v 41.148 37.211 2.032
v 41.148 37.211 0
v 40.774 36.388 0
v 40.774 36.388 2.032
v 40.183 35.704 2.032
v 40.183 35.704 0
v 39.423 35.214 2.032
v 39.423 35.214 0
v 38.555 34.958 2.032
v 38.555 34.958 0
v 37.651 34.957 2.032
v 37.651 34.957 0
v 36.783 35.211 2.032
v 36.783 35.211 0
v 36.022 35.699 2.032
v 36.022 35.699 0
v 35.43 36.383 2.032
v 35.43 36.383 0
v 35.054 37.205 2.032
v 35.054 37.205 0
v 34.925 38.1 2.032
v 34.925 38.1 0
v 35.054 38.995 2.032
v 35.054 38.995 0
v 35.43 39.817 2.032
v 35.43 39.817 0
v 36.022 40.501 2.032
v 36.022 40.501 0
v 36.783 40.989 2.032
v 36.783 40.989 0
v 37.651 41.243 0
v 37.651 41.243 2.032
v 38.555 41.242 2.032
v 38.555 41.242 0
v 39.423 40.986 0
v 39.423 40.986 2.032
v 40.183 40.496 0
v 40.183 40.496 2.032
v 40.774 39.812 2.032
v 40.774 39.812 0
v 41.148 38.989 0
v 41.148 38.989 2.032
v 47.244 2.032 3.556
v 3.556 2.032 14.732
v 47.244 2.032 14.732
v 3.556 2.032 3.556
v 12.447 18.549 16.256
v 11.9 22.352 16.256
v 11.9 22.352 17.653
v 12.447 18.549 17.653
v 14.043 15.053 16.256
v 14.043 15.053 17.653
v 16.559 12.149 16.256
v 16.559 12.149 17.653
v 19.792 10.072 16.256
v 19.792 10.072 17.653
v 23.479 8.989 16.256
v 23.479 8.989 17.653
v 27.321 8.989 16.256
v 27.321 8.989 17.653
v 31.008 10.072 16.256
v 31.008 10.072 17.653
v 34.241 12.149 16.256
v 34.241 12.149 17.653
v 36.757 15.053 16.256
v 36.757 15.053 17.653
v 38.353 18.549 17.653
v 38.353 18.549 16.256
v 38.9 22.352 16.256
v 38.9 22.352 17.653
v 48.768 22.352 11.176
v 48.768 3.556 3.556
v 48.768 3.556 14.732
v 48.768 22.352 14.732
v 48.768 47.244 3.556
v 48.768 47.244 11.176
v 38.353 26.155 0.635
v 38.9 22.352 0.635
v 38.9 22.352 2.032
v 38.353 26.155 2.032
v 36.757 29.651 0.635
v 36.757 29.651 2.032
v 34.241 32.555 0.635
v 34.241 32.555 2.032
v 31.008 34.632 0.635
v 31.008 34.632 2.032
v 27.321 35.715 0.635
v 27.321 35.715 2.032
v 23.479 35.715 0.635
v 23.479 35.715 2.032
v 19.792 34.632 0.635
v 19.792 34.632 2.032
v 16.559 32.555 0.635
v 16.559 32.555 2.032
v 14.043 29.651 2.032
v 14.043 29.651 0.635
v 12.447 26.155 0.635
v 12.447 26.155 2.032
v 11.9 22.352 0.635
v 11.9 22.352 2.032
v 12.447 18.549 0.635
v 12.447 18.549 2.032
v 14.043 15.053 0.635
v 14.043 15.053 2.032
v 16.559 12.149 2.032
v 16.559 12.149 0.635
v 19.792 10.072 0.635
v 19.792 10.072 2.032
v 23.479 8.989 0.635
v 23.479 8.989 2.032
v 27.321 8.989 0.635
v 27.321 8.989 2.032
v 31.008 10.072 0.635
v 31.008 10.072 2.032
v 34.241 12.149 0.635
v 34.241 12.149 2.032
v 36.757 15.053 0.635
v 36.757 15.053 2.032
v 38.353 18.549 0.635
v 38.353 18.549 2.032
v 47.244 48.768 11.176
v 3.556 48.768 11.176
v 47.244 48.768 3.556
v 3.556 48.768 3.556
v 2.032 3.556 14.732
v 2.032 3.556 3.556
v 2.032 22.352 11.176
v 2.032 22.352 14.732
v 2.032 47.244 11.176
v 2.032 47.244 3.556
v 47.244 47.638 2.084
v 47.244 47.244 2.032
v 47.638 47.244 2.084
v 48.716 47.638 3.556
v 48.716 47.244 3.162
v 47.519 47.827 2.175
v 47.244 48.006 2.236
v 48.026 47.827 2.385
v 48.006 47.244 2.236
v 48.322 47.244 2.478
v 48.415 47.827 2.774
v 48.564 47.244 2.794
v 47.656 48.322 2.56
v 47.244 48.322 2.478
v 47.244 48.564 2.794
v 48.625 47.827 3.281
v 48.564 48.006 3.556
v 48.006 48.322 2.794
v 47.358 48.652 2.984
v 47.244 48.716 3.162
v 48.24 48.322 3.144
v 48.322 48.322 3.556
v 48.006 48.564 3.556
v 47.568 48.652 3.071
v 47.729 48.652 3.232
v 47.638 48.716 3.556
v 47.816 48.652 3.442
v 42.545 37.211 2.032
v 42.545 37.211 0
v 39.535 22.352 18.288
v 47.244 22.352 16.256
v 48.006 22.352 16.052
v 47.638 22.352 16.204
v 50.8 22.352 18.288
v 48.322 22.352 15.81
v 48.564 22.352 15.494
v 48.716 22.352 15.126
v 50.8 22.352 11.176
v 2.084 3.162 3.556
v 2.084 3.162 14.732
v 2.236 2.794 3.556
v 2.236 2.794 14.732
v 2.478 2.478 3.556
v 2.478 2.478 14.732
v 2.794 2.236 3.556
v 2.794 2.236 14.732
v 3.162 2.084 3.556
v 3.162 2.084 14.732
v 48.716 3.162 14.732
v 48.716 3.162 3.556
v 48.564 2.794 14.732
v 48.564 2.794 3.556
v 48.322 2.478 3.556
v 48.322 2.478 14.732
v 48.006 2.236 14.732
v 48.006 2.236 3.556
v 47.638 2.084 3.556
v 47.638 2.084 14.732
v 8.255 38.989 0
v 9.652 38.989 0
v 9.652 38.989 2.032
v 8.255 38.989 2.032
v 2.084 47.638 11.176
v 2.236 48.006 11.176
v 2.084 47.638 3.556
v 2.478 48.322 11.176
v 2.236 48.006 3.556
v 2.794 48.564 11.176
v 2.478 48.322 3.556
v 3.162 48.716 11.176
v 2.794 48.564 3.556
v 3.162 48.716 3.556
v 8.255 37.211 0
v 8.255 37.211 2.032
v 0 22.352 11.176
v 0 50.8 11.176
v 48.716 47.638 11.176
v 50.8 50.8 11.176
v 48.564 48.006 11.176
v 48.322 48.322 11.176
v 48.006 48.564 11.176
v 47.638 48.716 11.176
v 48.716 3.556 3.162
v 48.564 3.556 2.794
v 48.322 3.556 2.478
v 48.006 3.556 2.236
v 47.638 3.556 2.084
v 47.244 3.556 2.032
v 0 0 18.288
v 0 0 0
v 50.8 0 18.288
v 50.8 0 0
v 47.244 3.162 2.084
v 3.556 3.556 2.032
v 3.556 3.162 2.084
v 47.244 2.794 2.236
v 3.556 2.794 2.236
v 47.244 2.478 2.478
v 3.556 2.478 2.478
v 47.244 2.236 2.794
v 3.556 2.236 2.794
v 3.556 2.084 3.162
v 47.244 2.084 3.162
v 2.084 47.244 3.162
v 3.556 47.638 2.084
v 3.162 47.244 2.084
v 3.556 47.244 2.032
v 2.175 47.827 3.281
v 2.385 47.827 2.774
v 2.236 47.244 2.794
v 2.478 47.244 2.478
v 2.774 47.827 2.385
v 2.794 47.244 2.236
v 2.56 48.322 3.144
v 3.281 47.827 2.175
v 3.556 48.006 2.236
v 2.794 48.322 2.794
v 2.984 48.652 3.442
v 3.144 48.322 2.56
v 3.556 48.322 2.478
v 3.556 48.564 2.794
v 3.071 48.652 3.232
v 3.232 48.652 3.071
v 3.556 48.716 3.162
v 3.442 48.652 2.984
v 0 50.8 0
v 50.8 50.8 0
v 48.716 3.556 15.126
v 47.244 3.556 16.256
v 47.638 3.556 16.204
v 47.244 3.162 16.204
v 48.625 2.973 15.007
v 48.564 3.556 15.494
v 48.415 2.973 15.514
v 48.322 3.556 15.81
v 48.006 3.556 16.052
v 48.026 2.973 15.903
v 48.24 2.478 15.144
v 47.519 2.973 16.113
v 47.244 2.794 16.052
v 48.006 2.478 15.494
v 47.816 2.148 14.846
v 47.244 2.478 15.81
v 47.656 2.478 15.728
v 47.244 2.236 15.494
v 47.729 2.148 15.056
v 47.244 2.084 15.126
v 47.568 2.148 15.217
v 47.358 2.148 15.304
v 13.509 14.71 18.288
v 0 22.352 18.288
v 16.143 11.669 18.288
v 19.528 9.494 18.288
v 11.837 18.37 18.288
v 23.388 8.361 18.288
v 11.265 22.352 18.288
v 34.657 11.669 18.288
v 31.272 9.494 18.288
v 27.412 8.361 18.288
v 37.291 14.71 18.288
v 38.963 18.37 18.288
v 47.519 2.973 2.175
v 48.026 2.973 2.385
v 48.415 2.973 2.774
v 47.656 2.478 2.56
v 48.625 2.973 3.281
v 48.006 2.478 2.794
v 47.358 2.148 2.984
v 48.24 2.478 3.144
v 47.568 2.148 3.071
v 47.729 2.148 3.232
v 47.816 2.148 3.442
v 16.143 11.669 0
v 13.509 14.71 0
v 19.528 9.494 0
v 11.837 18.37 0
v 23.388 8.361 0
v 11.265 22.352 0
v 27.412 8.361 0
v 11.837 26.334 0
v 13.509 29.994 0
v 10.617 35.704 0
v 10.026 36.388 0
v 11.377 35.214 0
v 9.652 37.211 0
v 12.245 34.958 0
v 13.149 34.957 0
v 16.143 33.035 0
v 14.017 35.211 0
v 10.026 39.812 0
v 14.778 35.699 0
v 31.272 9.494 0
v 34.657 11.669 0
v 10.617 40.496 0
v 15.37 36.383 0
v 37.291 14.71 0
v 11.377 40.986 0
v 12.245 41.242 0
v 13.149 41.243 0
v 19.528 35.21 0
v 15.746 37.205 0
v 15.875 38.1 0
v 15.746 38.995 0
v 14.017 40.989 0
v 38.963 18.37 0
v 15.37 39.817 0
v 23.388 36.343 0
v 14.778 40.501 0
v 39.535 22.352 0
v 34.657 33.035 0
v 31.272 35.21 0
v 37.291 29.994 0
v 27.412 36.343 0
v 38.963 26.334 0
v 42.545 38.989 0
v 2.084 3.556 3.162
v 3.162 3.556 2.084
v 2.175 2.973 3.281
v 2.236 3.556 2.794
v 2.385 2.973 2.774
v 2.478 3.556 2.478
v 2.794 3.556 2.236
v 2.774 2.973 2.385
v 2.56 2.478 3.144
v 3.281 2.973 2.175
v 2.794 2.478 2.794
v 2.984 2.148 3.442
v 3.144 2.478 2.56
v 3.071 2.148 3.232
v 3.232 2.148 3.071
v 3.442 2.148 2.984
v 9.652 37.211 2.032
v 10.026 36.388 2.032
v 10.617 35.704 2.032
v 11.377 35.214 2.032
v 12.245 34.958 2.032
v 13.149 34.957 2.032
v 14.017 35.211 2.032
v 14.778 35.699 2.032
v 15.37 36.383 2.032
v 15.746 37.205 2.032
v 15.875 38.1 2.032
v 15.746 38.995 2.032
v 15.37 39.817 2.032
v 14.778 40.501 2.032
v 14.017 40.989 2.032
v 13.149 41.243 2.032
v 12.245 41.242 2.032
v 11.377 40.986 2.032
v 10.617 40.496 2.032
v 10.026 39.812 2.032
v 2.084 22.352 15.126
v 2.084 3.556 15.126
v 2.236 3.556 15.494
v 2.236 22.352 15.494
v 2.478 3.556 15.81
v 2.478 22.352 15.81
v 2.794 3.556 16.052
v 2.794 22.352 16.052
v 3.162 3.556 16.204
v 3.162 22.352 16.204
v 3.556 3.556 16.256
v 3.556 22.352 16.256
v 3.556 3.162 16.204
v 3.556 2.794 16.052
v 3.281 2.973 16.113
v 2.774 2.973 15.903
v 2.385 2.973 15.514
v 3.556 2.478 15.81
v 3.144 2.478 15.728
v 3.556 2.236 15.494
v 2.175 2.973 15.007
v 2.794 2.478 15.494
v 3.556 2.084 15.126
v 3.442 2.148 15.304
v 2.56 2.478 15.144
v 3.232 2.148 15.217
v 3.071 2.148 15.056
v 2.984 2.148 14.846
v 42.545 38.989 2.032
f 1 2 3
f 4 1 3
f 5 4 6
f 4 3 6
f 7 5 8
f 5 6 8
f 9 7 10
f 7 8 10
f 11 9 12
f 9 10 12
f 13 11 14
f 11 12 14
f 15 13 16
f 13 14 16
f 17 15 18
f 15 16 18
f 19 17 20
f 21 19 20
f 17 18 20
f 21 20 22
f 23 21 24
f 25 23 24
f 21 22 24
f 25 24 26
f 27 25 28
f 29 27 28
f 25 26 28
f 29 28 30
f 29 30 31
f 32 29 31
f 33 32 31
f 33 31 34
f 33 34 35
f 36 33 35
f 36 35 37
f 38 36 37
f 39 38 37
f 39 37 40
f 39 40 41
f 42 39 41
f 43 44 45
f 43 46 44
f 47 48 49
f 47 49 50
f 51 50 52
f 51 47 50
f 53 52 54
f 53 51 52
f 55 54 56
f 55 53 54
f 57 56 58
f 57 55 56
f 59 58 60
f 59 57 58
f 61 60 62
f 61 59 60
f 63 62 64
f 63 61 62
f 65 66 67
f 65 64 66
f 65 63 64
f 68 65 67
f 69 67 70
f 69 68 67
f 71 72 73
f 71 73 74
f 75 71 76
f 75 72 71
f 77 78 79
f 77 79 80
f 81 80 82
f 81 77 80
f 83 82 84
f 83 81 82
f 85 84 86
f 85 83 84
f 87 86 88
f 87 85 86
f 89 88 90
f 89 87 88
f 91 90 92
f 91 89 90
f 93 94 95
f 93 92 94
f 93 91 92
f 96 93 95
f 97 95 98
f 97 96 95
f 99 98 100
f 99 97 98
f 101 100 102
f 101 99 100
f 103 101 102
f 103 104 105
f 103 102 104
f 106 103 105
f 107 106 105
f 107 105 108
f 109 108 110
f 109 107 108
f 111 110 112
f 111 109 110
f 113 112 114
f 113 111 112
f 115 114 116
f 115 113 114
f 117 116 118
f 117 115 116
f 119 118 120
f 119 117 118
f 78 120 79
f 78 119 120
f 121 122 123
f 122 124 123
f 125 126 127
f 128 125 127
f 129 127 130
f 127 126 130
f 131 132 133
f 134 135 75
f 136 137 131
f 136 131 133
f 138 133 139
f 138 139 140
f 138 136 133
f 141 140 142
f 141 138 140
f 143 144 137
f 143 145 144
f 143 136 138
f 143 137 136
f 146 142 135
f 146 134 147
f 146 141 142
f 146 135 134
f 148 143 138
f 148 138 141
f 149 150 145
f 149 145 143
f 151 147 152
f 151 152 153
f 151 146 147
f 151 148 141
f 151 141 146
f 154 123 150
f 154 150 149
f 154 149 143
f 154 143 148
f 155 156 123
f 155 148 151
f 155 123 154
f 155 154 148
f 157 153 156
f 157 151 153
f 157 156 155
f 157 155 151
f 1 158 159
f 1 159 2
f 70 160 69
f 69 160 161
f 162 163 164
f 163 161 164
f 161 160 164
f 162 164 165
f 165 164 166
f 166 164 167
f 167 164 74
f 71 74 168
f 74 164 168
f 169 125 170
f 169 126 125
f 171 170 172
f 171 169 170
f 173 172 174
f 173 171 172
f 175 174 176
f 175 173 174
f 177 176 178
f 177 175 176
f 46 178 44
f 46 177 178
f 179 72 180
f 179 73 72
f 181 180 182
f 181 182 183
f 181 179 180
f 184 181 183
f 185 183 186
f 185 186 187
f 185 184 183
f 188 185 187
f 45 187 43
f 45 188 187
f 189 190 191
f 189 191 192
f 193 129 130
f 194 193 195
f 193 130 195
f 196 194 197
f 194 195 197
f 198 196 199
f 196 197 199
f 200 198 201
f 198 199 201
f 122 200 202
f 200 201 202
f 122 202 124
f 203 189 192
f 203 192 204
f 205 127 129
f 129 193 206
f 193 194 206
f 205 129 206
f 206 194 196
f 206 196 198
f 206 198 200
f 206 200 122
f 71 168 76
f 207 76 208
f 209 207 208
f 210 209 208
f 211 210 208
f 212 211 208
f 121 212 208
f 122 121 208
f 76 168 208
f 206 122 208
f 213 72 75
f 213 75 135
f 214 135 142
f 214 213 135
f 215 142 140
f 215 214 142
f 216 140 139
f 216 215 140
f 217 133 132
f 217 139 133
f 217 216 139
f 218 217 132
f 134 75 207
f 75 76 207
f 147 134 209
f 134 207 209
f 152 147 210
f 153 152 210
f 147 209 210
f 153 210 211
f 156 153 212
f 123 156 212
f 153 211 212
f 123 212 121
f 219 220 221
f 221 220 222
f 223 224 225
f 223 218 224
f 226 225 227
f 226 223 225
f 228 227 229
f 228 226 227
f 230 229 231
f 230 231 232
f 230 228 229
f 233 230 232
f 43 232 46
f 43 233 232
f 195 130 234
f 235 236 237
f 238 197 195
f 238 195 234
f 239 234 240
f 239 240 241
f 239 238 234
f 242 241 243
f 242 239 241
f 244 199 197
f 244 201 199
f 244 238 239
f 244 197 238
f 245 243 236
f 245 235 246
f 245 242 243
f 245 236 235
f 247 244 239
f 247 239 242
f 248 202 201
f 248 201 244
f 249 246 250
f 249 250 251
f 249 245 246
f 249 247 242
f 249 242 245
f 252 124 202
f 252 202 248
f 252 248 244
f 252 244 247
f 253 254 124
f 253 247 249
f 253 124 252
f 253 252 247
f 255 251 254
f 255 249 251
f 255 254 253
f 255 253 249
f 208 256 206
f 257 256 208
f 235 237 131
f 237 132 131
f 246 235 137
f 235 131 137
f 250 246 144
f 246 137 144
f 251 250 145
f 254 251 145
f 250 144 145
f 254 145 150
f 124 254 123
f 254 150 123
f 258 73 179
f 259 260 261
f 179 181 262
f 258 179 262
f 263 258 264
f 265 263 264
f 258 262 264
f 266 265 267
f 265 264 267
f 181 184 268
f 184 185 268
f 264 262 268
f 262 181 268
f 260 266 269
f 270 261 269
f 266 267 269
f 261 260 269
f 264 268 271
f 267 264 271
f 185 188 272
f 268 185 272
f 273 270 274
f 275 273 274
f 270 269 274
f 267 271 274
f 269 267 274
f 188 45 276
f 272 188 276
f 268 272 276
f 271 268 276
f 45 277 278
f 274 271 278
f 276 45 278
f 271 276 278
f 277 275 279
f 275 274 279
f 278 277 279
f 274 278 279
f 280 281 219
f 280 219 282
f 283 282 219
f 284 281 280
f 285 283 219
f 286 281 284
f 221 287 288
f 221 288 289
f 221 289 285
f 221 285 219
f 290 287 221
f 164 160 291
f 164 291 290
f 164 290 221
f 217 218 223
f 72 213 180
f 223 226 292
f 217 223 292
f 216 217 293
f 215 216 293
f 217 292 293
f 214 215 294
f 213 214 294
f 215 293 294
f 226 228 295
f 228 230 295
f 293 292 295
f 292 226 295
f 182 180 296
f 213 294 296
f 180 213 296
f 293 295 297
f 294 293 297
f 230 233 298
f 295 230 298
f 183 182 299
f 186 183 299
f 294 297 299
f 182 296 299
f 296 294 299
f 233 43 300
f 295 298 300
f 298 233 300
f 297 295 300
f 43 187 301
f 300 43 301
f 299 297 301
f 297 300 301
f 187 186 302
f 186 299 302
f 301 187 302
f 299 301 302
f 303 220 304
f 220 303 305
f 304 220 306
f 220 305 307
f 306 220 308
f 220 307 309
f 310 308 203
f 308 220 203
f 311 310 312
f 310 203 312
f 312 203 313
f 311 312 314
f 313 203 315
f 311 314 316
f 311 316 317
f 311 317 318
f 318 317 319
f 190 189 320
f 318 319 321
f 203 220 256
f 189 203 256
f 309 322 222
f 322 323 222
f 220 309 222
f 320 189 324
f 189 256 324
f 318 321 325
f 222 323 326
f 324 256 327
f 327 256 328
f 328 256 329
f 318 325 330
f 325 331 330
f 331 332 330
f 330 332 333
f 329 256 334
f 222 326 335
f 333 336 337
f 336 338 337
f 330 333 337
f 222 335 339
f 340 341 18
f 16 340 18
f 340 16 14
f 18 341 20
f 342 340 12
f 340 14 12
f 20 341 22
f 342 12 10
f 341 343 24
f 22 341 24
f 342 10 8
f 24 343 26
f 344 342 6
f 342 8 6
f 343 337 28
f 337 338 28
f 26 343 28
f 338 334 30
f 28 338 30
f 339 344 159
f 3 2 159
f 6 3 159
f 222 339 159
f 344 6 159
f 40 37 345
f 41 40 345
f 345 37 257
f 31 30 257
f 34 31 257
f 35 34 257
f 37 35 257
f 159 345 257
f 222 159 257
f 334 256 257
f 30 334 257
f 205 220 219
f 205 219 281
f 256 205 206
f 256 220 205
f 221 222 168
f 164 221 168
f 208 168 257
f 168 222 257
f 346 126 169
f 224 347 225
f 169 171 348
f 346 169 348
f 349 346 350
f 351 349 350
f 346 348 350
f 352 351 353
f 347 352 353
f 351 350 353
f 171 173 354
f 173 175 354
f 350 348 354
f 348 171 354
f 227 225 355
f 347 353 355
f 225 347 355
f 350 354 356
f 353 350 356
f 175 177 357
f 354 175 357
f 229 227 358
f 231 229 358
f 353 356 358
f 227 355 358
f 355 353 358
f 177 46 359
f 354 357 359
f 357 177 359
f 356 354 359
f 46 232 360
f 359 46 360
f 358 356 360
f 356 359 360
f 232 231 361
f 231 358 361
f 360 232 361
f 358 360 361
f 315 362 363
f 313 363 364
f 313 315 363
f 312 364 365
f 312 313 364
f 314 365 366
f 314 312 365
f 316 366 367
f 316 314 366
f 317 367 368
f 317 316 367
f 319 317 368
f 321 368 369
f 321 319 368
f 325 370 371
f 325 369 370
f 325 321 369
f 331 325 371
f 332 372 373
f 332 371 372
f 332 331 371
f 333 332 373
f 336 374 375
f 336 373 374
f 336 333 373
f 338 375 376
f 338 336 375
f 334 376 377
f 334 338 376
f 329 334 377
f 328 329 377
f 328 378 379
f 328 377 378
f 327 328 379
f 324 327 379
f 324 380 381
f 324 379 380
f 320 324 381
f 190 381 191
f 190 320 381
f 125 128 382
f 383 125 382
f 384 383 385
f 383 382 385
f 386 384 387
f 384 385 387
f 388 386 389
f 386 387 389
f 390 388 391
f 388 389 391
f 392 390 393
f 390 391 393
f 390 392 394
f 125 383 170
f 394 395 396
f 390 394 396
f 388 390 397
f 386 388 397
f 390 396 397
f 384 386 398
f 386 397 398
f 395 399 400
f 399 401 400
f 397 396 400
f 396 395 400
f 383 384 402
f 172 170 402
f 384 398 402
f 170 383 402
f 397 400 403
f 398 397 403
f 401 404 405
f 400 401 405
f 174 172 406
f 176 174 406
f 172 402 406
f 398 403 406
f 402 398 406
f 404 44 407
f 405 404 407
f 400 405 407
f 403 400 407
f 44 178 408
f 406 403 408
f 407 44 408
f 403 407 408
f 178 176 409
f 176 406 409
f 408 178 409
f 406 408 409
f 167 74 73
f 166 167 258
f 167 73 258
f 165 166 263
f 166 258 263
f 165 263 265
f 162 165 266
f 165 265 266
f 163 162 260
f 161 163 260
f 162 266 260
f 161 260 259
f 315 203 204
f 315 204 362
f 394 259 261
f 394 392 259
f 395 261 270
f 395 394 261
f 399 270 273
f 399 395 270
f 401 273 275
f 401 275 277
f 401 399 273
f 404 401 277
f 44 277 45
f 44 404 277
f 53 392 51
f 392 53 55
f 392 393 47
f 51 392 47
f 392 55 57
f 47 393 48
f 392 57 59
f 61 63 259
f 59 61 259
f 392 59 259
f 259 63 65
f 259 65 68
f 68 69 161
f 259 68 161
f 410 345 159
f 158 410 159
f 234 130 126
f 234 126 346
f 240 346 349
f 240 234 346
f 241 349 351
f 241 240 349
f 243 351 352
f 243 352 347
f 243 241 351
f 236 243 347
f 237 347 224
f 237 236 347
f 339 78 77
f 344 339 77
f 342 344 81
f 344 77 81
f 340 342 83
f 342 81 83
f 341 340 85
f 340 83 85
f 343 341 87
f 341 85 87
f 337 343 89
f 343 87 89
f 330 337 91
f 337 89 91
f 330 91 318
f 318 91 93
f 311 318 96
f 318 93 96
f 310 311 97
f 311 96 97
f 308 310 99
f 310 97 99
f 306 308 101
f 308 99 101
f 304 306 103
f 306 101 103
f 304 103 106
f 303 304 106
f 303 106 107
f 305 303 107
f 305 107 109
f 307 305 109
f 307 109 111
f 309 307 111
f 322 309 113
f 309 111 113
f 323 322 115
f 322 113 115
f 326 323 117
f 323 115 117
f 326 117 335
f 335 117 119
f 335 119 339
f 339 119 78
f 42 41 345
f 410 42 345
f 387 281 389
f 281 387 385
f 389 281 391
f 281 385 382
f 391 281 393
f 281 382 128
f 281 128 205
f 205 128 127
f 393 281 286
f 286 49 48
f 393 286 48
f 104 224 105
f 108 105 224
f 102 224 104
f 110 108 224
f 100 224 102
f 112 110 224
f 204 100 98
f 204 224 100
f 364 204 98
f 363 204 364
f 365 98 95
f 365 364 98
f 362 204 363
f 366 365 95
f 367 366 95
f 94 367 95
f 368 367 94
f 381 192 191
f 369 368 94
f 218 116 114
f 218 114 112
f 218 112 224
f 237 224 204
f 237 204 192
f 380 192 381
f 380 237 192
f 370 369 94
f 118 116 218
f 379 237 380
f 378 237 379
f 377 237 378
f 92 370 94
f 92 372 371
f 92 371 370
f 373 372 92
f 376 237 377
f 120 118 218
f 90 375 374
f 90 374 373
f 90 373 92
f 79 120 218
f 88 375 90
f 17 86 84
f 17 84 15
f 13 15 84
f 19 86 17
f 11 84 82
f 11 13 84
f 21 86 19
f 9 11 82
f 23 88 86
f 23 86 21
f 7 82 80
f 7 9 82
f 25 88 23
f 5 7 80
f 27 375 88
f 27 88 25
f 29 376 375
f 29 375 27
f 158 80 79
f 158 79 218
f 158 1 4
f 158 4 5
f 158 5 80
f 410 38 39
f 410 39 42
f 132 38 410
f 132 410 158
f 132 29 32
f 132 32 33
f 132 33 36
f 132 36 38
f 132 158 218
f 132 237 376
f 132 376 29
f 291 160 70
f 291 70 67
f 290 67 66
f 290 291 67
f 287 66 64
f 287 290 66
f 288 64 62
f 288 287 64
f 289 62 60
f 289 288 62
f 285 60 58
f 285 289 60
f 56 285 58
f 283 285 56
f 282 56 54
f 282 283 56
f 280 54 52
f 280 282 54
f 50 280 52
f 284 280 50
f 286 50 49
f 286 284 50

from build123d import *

# Parameters (mm, degrees)
SKETCH1_W          = 50.8
SKETCH1_H          = 50.8
MAIN_BODY_DEPTH    = 18.288
SKETCH2_W          = 7.112
SKETCH2_H          = 28.448
FRONT_CUT_DEPTH    = 75.133197314
SHELL1_T           = -2.032
SKETCH3_R          = 13.5001
CENTER_HOLE_DEPTH  = 75.133197314
FILL060_VERT_R     = 1.524
FILL060_TB_R       = 1.524
CHAM025_SIZE       = 0.635
KEYED_HOLE_1_DEPTH = 60.460200948


with BuildPart() as part:
    # Sketch1 → main body (new body)
    with BuildSketch(Plane.XY):
        with Locations((25.4, 25.4)):
            Rectangle(SKETCH1_W, SKETCH1_H)
    extrude(amount=MAIN_BODY_DEPTH)

    # Sketch2 → front cut (cut, through all)
    with BuildSketch(Plane(origin=(50.8, 0, 0), x_dir=(0, 0, -1), z_dir=(1, 0, 0))):
        with Locations((-14.732, 36.576)):
            Rectangle(SKETCH2_W, SKETCH2_H)
    extrude(amount=-FRONT_CUT_DEPTH, mode=Mode.SUBTRACT)

    # Shell1
    shell1_openings = [part.faces().sort_by_distance(p)[0] for p in [
        (25.4, 36.576, 11.176),
        (25.4, 22.352, 14.732),
    ]]
    offset(amount=SHELL1_T, openings=shell1_openings, kind=Kind.INTERSECTION)

    # Sketch3 → center hole (cut, through all)
    with BuildSketch(Plane.XY):
        with Locations((25.4, 22.352)):
            Circle(SKETCH3_R)
    extrude(amount=CENTER_HOLE_DEPTH, mode=Mode.SUBTRACT)

    # fill060.vert
    fill060_vert_edges = [part.edges().sort_by_distance(p)[0] for p in [
        (2.032, 12.192, 16.256),
        (48.768, 12.192, 16.256),
        (2.032, 25.4, 2.032),
        (48.768, 25.4, 2.032),
    ]]
    fillet(fill060_vert_edges, radius=FILL060_VERT_R)

    # fill060.tb
    fill060_tb_edges = [part.edges().sort_by_distance(p)[0] for p in [
        (2.032, 48.768, 7.366),
        (48.768, 48.768, 7.366),
        (25.4, 2.032, 16.256),
        (25.4, 2.032, 2.032),
        (2.032, 2.032, 9.144),
        (48.768, 2.032, 9.144),
        (2.478369265, 2.032, 15.809630735),
        (2.478369265, 2.032, 2.478369265),
        (48.321630735, 2.032, 2.478369265),
        (48.321630735, 2.032, 15.809630735),
        (25.4, 48.768, 2.032),
        (2.478369265, 48.768, 2.478369265),
        (48.321630735, 48.768, 2.478369265),
    ]]
    fillet(fill060_tb_edges, radius=FILL060_TB_R)

    # cham025
    cham025_edges = [part.edges().sort_by_distance(p)[0] for p in [
        (11.8999, 22.352, 0),
        (25.4, 8.8519, 18.288),
    ]]
    chamfer(cham025_edges, length=CHAM025_SIZE)

    # Sketch6 → Keyed Hole 1 (cut, through all)
    with BuildSketch(Plane(origin=(10.255789697, 39.461773448, 0), x_dir=(-1, 0, 0), z_dir=(0, 0, -1))):
        with BuildLine():
            Line((0.603789697, -0.472773448), (2.000789697, -0.472773448))
            Line((2.000789697, -0.472773448), (2.000789697, -2.250773448))
            Line((2.000789697, -2.250773448), (0.603789697, -2.250773448))
            ThreePointArc((0.603789697, -2.250773448), (-5.619210303, -1.361773448), (0.603789697, -0.472773448))
        make_face()
    keyed_hole_1 = extrude(amount=-KEYED_HOLE_1_DEPTH, mode=Mode.SUBTRACT)

    # Mirror 1: Keyed Hole 1 across plane
    add(keyed_hole_1.mirror(Plane(origin=(25.4, 0, 0), x_dir=(0, 0, 1), z_dir=(1, 0, 0))), mode=Mode.SUBTRACT)


solid = part.part
